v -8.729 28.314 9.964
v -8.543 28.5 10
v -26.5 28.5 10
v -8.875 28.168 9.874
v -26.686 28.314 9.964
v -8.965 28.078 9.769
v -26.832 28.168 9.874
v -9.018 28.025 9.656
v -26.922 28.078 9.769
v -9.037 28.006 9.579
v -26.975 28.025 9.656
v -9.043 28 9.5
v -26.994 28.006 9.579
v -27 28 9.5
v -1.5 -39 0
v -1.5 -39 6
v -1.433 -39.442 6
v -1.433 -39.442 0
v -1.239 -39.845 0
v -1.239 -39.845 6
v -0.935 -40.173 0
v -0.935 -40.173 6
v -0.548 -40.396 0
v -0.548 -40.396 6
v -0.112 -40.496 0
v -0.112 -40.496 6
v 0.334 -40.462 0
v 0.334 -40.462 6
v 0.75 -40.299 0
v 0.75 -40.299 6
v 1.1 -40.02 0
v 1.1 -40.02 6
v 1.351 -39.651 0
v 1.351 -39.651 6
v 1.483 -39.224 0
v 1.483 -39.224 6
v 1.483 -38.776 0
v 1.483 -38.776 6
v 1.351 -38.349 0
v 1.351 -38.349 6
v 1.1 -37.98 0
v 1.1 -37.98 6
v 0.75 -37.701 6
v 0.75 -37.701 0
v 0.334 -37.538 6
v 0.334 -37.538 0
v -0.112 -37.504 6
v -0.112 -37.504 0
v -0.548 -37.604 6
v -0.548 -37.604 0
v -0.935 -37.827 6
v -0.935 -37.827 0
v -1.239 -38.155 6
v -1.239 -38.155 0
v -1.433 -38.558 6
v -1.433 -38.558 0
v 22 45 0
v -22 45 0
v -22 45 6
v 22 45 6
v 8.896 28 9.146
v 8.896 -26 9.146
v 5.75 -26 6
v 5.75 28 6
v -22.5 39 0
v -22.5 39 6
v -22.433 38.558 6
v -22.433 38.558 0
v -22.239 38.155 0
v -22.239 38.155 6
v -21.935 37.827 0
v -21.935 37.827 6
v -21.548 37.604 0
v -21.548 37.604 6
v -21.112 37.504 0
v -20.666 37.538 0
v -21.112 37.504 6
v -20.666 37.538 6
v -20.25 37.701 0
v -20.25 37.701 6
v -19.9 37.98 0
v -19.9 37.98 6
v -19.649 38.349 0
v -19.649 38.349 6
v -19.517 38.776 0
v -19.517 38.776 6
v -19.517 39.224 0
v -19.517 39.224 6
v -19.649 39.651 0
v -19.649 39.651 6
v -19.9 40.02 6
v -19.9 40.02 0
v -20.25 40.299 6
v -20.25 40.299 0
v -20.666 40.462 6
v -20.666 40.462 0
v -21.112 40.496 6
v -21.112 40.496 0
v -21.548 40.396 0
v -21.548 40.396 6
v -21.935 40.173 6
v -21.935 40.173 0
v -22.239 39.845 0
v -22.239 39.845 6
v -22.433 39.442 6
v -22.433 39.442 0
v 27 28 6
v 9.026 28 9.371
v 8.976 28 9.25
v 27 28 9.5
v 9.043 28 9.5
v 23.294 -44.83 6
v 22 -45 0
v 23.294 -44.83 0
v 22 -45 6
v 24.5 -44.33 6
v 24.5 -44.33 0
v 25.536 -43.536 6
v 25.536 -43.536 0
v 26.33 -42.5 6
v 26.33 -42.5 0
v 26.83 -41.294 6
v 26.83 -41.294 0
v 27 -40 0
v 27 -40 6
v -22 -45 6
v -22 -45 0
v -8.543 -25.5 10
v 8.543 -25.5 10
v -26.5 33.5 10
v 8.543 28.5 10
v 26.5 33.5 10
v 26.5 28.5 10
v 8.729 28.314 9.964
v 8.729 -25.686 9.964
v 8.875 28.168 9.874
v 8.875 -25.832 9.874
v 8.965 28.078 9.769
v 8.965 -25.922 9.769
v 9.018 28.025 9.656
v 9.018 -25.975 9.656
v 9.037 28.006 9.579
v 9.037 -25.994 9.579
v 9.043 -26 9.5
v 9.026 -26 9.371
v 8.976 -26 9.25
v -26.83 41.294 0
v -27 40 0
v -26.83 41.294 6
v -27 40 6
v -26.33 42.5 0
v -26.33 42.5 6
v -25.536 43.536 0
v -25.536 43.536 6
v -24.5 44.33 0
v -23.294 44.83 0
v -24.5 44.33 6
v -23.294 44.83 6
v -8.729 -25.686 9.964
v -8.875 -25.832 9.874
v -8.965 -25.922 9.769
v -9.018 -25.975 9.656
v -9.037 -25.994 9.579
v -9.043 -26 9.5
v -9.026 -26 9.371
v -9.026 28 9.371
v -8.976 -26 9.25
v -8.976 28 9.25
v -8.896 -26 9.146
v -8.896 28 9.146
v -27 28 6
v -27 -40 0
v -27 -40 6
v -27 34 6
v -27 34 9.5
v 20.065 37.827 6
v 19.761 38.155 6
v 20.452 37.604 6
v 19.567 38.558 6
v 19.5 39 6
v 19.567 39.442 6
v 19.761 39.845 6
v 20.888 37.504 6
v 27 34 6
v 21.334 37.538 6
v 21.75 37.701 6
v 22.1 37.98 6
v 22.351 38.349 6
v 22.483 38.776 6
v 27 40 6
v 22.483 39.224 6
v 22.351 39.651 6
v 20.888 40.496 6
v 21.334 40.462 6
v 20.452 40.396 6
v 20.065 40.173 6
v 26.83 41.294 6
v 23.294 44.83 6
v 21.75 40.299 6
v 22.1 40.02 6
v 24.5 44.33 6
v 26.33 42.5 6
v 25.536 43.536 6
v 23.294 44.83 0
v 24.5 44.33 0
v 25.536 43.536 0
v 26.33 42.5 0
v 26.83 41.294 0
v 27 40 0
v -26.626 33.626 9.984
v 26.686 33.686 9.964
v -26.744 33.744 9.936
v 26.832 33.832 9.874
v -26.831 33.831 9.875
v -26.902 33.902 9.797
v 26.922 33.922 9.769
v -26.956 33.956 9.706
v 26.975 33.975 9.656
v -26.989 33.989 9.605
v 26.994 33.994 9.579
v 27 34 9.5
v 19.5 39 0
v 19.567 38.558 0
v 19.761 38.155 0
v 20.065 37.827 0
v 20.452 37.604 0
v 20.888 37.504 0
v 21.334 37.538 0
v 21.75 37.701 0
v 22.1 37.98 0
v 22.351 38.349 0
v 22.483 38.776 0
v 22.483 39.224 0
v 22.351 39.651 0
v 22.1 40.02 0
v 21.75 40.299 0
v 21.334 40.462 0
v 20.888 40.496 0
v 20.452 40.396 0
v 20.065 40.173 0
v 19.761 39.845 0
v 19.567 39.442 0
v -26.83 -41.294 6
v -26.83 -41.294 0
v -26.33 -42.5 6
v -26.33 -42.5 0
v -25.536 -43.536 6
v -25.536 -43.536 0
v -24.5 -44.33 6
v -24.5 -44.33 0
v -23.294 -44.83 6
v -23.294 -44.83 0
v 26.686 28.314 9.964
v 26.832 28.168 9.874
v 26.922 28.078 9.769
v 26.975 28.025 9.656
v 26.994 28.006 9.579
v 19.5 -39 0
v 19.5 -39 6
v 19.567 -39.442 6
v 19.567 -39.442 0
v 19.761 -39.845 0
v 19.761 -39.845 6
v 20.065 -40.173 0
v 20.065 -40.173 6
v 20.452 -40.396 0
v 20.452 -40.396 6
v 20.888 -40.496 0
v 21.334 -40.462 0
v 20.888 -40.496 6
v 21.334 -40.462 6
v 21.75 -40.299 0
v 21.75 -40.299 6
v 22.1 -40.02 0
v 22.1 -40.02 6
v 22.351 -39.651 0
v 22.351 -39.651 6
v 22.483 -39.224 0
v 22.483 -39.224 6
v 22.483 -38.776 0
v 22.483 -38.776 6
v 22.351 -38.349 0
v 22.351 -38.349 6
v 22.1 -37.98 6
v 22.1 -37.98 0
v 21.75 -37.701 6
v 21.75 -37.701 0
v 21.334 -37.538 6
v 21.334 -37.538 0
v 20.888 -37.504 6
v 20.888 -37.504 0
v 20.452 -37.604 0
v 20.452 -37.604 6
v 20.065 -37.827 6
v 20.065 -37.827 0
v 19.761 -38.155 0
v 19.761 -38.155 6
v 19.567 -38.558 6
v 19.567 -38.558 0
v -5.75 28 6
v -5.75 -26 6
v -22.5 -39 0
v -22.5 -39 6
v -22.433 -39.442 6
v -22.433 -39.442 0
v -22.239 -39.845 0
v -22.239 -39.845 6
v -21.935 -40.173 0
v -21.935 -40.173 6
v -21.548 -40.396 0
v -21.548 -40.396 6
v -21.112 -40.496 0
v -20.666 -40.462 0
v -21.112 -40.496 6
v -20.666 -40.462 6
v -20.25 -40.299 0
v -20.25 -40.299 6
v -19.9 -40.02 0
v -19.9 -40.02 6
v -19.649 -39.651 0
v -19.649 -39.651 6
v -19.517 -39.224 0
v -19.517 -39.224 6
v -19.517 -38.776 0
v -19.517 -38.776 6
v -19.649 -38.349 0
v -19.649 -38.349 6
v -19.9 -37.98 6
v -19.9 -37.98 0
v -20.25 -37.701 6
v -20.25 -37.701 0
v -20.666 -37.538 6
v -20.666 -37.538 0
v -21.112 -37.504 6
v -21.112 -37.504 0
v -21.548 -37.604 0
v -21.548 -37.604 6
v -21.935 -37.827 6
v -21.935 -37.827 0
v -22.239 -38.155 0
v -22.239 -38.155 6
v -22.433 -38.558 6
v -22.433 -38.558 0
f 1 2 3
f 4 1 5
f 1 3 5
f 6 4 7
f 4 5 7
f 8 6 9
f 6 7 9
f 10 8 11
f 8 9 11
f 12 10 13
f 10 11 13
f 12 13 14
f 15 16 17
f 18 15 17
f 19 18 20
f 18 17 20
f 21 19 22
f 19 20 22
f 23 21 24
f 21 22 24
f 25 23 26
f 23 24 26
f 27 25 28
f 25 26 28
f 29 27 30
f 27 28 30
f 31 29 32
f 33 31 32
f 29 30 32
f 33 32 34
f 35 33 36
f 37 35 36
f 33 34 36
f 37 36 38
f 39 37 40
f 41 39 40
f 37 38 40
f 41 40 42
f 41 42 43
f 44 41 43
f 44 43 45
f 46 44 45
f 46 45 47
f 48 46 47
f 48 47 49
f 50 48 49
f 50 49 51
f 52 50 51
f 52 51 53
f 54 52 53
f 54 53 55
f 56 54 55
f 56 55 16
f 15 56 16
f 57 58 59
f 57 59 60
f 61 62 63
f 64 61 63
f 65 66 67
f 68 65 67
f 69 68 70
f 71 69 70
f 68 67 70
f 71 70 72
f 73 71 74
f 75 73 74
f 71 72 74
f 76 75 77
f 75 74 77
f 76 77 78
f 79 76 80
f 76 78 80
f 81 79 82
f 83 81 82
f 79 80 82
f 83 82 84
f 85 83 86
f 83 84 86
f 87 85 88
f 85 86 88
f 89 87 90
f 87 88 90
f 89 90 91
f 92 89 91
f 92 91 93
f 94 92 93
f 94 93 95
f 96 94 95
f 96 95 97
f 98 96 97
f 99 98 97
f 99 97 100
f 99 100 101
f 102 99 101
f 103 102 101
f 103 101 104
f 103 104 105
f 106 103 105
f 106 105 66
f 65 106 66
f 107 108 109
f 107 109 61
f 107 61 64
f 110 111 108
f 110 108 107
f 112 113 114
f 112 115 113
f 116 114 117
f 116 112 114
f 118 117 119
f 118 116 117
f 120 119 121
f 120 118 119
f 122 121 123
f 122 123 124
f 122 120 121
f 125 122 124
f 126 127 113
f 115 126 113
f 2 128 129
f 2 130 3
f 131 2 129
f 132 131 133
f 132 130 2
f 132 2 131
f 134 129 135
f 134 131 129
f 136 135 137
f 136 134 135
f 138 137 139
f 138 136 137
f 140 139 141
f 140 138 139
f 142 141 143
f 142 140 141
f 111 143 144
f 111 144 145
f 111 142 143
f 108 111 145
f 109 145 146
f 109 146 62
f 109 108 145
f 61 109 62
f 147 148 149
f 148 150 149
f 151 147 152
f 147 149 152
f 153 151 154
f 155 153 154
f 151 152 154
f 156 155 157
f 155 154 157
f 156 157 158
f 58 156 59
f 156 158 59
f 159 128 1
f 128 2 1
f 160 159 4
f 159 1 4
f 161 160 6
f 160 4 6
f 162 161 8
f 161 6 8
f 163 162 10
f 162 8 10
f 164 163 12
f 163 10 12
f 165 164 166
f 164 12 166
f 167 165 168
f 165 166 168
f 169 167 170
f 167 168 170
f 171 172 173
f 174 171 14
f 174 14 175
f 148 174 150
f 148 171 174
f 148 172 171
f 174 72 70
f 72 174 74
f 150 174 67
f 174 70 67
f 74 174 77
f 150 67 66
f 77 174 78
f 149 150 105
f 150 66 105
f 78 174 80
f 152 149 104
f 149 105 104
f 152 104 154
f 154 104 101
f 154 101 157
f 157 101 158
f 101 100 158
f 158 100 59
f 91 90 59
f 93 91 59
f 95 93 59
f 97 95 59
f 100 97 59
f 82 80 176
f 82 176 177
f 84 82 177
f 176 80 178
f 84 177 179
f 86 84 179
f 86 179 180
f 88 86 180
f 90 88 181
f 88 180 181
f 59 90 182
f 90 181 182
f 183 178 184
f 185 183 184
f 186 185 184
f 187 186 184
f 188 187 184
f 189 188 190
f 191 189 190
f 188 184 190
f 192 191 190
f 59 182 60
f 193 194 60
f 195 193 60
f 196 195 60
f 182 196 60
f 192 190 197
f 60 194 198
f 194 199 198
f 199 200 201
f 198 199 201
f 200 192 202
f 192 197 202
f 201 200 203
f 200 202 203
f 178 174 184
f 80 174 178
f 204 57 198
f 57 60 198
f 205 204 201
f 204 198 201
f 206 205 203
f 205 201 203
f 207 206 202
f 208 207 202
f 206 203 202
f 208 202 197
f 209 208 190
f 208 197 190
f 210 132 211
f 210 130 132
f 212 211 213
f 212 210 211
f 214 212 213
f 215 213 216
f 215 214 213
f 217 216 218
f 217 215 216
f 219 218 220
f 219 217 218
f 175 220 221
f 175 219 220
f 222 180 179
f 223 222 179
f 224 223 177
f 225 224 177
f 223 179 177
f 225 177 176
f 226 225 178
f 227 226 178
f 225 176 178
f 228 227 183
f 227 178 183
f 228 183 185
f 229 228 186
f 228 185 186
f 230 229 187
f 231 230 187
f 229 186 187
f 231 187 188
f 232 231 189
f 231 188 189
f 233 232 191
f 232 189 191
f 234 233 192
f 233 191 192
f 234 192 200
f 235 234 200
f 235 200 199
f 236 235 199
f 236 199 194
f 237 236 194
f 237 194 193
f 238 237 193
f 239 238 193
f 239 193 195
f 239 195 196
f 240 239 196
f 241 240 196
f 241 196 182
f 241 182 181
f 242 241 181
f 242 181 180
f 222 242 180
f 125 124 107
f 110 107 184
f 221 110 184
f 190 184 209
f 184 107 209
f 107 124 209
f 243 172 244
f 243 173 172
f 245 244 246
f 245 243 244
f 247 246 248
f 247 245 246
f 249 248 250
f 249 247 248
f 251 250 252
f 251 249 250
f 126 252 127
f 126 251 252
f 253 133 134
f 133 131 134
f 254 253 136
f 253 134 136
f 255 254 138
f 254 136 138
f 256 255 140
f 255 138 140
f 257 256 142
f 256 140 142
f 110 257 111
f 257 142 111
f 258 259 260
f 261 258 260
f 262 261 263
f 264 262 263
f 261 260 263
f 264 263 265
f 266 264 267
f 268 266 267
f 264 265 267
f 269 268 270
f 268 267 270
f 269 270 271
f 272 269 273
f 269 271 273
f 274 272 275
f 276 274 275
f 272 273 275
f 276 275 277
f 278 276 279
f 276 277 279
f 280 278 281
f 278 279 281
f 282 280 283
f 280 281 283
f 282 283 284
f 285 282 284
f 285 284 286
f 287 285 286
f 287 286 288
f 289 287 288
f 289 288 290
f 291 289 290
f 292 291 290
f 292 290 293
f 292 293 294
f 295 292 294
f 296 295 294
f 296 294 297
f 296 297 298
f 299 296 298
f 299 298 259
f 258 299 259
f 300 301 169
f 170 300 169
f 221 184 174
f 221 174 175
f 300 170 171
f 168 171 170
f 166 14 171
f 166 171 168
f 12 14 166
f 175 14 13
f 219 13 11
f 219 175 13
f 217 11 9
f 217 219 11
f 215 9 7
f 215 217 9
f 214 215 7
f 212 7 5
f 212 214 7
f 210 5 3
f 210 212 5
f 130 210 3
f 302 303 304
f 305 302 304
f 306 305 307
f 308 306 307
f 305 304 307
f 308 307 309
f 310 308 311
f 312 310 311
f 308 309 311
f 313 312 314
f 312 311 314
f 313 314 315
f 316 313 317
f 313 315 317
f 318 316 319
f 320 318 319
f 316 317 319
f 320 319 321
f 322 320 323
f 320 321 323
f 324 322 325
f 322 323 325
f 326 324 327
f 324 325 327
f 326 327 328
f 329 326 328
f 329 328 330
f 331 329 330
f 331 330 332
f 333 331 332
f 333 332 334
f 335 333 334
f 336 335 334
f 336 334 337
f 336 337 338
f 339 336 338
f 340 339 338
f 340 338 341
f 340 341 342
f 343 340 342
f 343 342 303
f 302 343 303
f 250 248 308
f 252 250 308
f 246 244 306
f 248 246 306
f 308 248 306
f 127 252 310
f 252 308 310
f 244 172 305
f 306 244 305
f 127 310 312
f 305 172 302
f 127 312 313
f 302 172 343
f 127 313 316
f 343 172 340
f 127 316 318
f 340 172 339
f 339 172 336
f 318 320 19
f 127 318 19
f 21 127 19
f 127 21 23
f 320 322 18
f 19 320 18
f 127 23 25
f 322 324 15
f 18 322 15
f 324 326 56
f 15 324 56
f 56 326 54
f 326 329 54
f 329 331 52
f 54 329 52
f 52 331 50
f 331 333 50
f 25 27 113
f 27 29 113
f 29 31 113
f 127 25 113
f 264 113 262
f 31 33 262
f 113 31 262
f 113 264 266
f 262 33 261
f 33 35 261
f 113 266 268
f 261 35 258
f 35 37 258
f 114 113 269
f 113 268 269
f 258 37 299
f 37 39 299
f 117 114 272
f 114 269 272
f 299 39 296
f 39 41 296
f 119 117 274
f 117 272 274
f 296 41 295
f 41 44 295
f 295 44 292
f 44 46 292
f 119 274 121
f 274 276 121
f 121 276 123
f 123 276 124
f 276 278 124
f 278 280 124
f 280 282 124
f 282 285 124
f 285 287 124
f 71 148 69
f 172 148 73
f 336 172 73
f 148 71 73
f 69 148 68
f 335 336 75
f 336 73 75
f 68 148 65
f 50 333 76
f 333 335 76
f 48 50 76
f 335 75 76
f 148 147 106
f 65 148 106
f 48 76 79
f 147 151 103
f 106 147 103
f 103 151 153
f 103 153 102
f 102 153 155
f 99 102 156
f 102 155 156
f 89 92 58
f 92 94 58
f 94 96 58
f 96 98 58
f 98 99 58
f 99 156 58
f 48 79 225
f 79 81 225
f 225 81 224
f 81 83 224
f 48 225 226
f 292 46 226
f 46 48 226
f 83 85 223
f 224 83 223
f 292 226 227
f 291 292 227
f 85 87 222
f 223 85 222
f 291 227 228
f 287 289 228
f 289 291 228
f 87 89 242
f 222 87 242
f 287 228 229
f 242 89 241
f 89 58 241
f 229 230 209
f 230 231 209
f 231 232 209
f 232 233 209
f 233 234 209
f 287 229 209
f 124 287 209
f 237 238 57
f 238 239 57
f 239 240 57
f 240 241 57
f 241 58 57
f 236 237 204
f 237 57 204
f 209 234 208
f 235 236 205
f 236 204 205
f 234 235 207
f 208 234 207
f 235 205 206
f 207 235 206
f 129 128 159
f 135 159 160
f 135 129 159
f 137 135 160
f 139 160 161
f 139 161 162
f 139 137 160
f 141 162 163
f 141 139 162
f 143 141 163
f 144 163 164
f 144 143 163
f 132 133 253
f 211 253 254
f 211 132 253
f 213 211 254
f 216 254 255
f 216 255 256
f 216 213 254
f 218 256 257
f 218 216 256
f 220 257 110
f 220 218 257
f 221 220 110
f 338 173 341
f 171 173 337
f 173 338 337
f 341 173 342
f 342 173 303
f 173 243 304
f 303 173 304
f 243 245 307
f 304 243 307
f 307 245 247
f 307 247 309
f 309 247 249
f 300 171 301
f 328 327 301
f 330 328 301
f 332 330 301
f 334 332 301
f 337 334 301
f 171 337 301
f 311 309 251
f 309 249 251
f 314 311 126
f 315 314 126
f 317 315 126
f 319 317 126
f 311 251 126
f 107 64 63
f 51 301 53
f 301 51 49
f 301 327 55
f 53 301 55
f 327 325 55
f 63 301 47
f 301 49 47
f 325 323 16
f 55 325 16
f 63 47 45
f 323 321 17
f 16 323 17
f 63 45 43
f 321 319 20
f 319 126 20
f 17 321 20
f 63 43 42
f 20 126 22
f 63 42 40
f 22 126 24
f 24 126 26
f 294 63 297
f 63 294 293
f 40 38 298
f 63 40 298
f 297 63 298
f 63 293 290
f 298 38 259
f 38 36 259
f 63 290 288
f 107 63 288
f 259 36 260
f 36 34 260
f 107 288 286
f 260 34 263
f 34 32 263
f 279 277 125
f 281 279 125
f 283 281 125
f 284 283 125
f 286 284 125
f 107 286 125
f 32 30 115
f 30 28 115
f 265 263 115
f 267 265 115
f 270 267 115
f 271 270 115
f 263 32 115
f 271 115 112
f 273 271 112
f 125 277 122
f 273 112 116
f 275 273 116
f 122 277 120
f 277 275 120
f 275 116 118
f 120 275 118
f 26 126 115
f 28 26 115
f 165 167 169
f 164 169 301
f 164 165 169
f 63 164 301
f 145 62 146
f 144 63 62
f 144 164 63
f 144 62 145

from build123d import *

# Parameters (mm, degrees)
F0_W      = 54
F0_H      = 90
F1_DEPTH  = 10
F3_DEPTH  = 73
F5_D      = 3
F6_W      = 11
F6_H      = 4
F7_DEPTH  = 54.001
F8_R      = 5
F9_W      = 19.5
F9_H      = 19
F9_R      = 1.5
F10_DEPTH = 4
F11_R     = 0.5


with BuildPart() as f1:
    # F0 (on Top) → F1 (new body)
    with BuildSketch(Plane.XY):
        Rectangle(F0_W, F0_H)
    extrude(amount=F1_DEPTH)

    # F2 (on face) → F3 (cut)
    with BuildSketch(Plane.XZ.offset(45)):
        Polygon((-27, 10), (-27, 6), (-5.75, 6), (-9.75, 10), align=None)
        Polygon((5.75, 6), (27, 6), (27, 10), (9.75, 10), align=None)
    extrude(amount=-F3_DEPTH, mode=Mode.SUBTRACT)

    # F5 (through all)
    with Locations(Plane(origin=(0, 0, 0), x_dir=(1, 0, 0), z_dir=(0, 0, -1))):
        with Locations((-21, 39), (21, 39), (21, -39), (-21, -39), (0, 39)):
            Hole(F5_D / 2)

    # F6 (on face) → F7 (cut, through all)
    with BuildSketch(Plane.YZ.offset(27)):
        with Locations((39.5, 8)):
            Rectangle(F6_W, F6_H)
    extrude(amount=-F7_DEPTH, mode=Mode.SUBTRACT)

    # F8
    f8_edges = [f1.edges().sort_by_distance(p)[0] for p in [
        (27, -45, 3),
        (27, 45, 3),
        (-27, 45, 3),
        (-27, -45, 3),
    ]]
    fillet(f8_edges, radius=F8_R)

    # F9 (on face) → F10 (cut)
    with BuildSketch(Plane.XY.offset(10)):
        with Locations((0, -35.5)):
            Rectangle(F9_W, F9_H)
        with Locations((0, -39)):
            Circle(F9_R, mode=Mode.SUBTRACT)
    extrude(amount=-F10_DEPTH, mode=Mode.SUBTRACT)

    # F11
    f11_edges = [f1.edges().sort_by_distance(p)[0] for p in [
        (-9.75, 1, 10),
        (9.75, 1, 10),
        (-18.375, 28, 10),
        (18.375, 28, 10),
        (0, -26, 10),
        (-27, 31, 10),
        (0, 34, 10),
        (27, 31, 10),
    ]]
    fillet(f11_edges, radius=F11_R)


solid = f1.part
